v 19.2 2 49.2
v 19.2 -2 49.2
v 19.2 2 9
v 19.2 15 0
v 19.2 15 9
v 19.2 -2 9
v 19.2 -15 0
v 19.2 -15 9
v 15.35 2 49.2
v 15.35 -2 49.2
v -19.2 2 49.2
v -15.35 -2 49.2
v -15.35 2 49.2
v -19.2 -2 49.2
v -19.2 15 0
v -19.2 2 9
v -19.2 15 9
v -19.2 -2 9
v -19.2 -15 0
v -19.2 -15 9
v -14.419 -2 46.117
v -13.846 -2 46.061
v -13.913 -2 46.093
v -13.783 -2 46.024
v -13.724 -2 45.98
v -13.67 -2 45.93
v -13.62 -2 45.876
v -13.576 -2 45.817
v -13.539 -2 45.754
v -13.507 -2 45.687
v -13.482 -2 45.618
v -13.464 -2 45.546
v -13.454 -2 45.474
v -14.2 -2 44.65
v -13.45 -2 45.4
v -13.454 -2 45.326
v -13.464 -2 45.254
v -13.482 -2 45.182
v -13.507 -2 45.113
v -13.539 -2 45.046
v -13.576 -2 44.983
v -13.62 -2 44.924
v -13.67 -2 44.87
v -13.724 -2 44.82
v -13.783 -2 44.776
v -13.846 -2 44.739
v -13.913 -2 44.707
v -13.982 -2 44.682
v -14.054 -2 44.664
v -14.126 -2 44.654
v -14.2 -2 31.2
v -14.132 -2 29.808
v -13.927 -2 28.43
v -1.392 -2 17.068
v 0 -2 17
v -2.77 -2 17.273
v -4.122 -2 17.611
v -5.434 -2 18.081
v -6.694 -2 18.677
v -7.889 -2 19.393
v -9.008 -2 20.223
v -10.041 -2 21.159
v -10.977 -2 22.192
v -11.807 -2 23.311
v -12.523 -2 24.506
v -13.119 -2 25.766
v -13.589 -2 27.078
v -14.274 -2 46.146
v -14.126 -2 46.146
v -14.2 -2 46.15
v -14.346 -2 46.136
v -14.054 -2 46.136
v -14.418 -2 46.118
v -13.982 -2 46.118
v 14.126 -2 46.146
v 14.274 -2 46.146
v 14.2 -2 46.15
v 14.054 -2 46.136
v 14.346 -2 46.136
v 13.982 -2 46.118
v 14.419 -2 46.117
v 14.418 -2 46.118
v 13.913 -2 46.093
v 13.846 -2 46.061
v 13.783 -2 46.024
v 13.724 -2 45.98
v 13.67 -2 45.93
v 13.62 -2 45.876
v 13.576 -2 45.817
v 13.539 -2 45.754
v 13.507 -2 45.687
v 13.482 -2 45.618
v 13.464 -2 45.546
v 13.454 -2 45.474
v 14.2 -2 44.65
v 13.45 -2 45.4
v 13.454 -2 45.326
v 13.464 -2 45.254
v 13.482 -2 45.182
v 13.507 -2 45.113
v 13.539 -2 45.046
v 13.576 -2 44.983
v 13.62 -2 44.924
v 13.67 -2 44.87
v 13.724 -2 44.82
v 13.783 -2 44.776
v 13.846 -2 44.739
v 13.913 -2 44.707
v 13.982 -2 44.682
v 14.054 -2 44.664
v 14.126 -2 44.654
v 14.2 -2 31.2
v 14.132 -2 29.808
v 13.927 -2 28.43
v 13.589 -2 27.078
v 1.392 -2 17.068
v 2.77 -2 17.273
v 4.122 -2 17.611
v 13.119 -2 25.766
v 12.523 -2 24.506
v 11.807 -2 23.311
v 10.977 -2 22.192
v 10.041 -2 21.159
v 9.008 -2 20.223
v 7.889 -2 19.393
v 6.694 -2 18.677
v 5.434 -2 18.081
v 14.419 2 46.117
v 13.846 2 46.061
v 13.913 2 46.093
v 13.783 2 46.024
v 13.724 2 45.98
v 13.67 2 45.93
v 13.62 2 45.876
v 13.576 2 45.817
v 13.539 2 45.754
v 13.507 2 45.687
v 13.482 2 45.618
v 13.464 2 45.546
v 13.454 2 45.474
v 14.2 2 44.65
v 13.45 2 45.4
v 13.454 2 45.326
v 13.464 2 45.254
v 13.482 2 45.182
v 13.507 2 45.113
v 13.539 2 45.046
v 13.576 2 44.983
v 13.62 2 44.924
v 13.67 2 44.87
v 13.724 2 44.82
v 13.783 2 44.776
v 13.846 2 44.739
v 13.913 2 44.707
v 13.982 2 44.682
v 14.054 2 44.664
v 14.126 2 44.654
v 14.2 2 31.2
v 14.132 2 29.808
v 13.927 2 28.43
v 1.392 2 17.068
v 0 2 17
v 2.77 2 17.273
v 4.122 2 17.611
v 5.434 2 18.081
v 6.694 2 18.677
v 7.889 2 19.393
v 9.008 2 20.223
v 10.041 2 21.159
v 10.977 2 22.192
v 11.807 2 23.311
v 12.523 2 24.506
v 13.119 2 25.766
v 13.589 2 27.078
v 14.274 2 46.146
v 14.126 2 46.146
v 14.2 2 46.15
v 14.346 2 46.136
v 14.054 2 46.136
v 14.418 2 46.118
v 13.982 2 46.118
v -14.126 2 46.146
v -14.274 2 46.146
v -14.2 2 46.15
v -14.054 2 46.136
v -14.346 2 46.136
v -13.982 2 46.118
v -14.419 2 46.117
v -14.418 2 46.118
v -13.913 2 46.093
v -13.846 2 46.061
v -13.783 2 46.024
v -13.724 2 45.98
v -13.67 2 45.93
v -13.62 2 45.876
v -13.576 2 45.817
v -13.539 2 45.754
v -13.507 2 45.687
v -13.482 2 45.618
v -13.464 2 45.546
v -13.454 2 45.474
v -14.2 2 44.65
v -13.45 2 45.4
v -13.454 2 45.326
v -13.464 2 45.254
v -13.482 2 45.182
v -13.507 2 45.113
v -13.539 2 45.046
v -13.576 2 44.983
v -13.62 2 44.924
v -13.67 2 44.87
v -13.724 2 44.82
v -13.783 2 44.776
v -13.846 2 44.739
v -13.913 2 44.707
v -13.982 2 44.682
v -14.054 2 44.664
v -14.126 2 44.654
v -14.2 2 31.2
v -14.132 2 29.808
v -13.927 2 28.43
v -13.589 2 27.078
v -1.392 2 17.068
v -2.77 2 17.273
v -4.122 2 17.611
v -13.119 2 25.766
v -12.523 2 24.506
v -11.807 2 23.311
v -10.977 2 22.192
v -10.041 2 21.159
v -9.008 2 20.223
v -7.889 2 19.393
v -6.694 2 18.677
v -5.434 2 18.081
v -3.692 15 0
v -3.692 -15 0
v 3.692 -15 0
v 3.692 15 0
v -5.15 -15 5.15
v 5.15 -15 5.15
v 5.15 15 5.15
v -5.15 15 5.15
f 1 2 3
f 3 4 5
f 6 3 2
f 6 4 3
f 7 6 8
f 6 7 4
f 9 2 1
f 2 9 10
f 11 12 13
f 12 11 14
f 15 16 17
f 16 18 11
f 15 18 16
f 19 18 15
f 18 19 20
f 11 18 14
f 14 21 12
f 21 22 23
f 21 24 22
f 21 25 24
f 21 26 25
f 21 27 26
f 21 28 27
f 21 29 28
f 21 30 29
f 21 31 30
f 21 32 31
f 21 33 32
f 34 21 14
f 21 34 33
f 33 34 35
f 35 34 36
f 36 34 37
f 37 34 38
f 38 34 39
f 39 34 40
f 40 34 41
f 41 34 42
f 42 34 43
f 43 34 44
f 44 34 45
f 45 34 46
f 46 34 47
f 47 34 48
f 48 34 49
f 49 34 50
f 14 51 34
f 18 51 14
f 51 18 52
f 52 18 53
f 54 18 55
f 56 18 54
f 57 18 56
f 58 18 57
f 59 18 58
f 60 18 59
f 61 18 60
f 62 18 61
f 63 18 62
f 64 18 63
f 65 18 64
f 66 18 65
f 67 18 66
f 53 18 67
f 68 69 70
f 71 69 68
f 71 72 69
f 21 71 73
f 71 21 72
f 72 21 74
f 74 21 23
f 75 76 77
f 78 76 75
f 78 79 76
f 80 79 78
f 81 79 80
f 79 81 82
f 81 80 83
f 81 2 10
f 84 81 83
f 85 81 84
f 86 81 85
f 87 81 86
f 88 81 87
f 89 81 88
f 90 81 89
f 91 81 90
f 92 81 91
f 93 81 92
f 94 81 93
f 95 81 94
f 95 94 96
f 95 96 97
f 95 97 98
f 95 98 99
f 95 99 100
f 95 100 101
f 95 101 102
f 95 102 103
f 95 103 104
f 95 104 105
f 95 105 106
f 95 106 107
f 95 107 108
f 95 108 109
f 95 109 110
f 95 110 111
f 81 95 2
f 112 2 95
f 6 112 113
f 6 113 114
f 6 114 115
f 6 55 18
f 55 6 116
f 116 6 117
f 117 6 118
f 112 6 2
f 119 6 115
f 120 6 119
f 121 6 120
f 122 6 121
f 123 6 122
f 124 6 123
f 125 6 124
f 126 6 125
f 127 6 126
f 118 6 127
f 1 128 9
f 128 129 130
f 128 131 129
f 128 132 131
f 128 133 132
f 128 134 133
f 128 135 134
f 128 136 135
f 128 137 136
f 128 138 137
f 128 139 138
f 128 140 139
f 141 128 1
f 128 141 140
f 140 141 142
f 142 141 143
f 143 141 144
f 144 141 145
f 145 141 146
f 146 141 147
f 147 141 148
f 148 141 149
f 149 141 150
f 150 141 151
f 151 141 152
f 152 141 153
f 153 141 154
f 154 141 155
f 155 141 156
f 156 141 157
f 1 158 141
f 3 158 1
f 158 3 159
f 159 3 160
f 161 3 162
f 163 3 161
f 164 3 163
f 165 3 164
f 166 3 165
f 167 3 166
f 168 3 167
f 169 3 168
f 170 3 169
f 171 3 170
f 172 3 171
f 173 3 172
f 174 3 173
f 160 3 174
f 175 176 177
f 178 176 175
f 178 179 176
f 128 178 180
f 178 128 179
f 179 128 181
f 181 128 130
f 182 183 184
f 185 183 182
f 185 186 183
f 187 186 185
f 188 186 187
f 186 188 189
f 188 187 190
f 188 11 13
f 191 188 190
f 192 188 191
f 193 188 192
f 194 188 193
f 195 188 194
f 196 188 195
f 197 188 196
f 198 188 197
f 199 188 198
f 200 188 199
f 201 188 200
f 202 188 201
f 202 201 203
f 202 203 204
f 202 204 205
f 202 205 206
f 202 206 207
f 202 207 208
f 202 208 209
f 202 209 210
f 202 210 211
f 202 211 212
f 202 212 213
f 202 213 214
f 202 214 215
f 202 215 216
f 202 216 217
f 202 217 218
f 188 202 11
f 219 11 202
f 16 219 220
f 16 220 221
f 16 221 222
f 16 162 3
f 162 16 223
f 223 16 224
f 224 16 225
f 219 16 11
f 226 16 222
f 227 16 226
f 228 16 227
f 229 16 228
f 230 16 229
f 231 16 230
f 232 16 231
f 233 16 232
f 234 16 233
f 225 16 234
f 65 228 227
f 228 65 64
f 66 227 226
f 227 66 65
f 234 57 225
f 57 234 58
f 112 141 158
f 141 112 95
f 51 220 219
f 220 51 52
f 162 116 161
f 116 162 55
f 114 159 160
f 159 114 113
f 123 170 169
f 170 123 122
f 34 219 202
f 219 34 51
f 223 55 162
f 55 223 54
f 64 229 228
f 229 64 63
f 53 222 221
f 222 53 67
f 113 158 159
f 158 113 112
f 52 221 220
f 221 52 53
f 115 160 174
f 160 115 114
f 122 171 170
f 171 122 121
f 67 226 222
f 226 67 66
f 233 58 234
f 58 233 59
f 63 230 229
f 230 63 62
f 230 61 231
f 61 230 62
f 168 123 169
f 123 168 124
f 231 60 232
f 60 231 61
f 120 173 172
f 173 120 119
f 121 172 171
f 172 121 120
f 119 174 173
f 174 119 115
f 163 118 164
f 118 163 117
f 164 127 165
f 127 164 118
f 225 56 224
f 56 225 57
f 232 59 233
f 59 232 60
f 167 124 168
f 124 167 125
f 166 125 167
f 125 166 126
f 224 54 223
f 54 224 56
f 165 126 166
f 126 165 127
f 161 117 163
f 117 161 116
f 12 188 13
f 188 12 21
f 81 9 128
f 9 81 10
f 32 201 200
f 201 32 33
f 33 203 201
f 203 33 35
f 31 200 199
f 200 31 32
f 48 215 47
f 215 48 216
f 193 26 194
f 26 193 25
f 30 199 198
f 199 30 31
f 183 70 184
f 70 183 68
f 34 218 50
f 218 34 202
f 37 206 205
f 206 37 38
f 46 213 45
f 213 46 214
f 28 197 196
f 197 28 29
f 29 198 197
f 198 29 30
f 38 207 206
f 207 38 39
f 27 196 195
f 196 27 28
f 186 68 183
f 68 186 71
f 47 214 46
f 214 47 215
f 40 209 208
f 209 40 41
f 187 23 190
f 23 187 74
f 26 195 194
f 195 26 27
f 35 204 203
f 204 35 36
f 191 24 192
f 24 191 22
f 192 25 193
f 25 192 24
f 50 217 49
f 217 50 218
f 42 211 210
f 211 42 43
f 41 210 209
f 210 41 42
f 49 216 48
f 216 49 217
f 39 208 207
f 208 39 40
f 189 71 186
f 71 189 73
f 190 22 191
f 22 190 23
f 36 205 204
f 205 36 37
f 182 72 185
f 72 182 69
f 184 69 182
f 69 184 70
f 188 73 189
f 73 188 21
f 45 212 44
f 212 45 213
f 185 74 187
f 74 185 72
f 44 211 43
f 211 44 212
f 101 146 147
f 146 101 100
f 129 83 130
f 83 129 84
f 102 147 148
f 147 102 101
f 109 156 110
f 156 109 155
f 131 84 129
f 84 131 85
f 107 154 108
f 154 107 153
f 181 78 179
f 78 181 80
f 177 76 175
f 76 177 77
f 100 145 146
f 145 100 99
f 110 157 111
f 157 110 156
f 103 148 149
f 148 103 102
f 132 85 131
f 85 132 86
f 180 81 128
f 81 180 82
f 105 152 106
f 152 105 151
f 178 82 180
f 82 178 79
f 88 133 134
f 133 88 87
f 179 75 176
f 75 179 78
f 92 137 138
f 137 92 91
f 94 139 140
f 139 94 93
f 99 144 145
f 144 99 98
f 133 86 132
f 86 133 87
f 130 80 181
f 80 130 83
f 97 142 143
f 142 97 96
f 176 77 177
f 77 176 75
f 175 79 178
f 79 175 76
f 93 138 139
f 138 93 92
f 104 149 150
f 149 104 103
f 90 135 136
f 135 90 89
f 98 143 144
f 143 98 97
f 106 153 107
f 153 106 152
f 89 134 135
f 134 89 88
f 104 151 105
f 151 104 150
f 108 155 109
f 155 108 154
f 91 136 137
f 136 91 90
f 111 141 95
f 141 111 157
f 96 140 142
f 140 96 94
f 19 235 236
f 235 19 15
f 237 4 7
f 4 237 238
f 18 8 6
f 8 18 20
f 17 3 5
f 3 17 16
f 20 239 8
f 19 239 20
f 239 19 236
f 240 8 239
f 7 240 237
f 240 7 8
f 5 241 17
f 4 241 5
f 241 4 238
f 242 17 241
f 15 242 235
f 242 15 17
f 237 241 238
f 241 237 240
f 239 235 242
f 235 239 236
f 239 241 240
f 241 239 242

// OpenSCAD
// =====================================
// Cap-Up Toothpaste Hanger Piece
// Backing block + dovetail channel + cap-neck fork; hooks onto the existing
// backplate's toothpaste rail in place of "Toothpaste clip.scad"
// Print with the dovetail channel face down on the bed — prongs point up
// =====================================

include <_toothbrush_holder.scad>

rotate([180, 0, 0])
translate([0, 0, -(grip_outer_x - plate_thickness)])
    paste_hanger_piece();
